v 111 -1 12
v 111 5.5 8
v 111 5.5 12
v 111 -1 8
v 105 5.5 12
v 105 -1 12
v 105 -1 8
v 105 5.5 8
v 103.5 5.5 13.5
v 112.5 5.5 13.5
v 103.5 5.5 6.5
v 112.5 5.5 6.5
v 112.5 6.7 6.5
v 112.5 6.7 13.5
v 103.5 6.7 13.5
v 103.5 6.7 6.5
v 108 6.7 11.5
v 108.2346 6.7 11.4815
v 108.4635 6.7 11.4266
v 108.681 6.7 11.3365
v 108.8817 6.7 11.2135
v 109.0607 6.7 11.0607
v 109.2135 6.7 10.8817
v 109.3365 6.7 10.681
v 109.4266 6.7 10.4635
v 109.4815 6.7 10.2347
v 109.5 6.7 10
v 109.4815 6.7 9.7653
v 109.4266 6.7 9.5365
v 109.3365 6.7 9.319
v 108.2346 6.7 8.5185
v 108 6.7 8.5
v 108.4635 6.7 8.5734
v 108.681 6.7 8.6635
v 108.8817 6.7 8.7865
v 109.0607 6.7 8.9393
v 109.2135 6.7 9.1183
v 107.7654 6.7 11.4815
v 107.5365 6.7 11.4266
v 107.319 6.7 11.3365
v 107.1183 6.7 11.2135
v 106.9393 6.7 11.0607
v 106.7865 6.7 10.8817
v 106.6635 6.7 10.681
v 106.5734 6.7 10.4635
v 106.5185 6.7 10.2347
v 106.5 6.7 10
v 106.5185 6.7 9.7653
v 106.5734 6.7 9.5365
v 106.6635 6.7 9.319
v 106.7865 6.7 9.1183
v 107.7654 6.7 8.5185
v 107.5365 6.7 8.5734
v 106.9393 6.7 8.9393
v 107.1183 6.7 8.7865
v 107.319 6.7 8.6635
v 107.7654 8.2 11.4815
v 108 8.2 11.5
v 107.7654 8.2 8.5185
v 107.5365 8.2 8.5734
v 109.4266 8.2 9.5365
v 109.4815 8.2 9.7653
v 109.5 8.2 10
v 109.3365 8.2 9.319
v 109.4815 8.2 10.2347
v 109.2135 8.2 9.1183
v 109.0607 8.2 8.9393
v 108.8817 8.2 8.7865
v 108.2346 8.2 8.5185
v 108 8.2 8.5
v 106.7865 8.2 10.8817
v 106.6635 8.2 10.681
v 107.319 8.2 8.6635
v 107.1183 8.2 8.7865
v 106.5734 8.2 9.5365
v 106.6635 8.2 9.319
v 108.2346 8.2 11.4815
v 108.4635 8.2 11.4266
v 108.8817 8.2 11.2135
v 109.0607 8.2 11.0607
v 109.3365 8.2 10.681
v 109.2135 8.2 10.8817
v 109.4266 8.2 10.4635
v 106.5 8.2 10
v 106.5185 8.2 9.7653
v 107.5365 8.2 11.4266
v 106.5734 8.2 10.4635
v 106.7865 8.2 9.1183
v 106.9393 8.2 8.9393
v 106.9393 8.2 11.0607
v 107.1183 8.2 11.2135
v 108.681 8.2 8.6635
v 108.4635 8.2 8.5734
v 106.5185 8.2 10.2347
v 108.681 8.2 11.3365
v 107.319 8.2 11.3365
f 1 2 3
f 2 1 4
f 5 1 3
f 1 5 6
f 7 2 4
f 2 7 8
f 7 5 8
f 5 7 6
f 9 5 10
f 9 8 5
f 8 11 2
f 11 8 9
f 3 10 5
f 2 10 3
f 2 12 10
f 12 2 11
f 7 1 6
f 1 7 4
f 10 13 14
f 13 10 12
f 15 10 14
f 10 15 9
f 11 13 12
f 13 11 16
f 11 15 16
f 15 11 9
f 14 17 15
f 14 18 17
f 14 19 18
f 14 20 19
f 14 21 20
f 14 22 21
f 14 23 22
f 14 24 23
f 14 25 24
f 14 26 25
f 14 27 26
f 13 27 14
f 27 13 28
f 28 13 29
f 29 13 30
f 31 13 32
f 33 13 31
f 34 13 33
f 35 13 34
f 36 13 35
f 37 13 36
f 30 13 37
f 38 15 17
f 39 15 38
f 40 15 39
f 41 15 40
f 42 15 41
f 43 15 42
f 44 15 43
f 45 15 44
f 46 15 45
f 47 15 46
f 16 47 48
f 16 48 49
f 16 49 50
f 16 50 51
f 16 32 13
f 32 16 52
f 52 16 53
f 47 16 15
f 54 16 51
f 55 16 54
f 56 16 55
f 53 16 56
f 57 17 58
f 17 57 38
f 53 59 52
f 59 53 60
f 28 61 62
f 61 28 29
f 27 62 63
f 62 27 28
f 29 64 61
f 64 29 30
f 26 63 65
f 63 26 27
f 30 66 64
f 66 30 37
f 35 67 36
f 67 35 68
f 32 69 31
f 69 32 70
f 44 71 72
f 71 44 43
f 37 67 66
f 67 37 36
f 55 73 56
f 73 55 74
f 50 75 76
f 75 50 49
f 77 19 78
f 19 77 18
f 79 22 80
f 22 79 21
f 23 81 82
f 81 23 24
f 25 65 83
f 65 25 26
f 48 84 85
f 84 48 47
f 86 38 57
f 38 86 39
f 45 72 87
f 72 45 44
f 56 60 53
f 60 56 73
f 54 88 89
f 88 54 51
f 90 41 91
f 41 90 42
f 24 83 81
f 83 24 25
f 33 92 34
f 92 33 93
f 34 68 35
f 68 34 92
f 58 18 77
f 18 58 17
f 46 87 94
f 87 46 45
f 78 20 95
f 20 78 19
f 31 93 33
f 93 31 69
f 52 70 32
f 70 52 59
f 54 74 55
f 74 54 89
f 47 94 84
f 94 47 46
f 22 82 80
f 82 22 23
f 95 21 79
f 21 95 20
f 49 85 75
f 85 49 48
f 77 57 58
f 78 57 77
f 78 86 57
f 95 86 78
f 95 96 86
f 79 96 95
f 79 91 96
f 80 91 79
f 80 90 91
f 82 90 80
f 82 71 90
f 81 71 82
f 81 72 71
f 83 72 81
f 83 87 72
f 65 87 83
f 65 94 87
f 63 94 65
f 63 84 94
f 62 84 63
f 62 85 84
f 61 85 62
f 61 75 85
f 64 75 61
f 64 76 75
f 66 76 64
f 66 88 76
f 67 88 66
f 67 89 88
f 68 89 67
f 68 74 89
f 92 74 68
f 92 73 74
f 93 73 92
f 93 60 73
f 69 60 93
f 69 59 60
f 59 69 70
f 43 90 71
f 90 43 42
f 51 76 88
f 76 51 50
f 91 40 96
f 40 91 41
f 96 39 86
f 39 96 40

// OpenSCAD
// Ktemata r1 - Internal bottom power button (presses the power bank button)
// Insert from the inside before fitting the battery. Modelled in assembly position.
include <common.scad>

module power_button() {
    cw = BTN_W; ch = BTN_HH;                 // shaft through the wall
    gap_end = BAT_Y + BAT_H + 0.3;           // battery edge (+0.3 rest gap)
    sleeve_in = L - WALL - 2.5;              // inner end of the guide sleeve
    // cap + shaft: from 1 mm proud of the outside to the sleeve
    at(BTN_X - cw/2, L + 1, BTN_Z - ch/2) cube([cw, 1 + WALL + 2.5, ch]);
    // stop flange
    at(BTN_X - 4.5, sleeve_in, BTN_Z - 3.5) cube([9, 1.2, 7]);
    // nub towards the battery button
    at(BTN_X, sleeve_in - 1.2, BTN_Z) rotate([-90,0,0]) cylinder(d=3, h=sleeve_in - 1.2 - gap_end);
}
if (is_undef(ASSEMBLY)) power_button();
